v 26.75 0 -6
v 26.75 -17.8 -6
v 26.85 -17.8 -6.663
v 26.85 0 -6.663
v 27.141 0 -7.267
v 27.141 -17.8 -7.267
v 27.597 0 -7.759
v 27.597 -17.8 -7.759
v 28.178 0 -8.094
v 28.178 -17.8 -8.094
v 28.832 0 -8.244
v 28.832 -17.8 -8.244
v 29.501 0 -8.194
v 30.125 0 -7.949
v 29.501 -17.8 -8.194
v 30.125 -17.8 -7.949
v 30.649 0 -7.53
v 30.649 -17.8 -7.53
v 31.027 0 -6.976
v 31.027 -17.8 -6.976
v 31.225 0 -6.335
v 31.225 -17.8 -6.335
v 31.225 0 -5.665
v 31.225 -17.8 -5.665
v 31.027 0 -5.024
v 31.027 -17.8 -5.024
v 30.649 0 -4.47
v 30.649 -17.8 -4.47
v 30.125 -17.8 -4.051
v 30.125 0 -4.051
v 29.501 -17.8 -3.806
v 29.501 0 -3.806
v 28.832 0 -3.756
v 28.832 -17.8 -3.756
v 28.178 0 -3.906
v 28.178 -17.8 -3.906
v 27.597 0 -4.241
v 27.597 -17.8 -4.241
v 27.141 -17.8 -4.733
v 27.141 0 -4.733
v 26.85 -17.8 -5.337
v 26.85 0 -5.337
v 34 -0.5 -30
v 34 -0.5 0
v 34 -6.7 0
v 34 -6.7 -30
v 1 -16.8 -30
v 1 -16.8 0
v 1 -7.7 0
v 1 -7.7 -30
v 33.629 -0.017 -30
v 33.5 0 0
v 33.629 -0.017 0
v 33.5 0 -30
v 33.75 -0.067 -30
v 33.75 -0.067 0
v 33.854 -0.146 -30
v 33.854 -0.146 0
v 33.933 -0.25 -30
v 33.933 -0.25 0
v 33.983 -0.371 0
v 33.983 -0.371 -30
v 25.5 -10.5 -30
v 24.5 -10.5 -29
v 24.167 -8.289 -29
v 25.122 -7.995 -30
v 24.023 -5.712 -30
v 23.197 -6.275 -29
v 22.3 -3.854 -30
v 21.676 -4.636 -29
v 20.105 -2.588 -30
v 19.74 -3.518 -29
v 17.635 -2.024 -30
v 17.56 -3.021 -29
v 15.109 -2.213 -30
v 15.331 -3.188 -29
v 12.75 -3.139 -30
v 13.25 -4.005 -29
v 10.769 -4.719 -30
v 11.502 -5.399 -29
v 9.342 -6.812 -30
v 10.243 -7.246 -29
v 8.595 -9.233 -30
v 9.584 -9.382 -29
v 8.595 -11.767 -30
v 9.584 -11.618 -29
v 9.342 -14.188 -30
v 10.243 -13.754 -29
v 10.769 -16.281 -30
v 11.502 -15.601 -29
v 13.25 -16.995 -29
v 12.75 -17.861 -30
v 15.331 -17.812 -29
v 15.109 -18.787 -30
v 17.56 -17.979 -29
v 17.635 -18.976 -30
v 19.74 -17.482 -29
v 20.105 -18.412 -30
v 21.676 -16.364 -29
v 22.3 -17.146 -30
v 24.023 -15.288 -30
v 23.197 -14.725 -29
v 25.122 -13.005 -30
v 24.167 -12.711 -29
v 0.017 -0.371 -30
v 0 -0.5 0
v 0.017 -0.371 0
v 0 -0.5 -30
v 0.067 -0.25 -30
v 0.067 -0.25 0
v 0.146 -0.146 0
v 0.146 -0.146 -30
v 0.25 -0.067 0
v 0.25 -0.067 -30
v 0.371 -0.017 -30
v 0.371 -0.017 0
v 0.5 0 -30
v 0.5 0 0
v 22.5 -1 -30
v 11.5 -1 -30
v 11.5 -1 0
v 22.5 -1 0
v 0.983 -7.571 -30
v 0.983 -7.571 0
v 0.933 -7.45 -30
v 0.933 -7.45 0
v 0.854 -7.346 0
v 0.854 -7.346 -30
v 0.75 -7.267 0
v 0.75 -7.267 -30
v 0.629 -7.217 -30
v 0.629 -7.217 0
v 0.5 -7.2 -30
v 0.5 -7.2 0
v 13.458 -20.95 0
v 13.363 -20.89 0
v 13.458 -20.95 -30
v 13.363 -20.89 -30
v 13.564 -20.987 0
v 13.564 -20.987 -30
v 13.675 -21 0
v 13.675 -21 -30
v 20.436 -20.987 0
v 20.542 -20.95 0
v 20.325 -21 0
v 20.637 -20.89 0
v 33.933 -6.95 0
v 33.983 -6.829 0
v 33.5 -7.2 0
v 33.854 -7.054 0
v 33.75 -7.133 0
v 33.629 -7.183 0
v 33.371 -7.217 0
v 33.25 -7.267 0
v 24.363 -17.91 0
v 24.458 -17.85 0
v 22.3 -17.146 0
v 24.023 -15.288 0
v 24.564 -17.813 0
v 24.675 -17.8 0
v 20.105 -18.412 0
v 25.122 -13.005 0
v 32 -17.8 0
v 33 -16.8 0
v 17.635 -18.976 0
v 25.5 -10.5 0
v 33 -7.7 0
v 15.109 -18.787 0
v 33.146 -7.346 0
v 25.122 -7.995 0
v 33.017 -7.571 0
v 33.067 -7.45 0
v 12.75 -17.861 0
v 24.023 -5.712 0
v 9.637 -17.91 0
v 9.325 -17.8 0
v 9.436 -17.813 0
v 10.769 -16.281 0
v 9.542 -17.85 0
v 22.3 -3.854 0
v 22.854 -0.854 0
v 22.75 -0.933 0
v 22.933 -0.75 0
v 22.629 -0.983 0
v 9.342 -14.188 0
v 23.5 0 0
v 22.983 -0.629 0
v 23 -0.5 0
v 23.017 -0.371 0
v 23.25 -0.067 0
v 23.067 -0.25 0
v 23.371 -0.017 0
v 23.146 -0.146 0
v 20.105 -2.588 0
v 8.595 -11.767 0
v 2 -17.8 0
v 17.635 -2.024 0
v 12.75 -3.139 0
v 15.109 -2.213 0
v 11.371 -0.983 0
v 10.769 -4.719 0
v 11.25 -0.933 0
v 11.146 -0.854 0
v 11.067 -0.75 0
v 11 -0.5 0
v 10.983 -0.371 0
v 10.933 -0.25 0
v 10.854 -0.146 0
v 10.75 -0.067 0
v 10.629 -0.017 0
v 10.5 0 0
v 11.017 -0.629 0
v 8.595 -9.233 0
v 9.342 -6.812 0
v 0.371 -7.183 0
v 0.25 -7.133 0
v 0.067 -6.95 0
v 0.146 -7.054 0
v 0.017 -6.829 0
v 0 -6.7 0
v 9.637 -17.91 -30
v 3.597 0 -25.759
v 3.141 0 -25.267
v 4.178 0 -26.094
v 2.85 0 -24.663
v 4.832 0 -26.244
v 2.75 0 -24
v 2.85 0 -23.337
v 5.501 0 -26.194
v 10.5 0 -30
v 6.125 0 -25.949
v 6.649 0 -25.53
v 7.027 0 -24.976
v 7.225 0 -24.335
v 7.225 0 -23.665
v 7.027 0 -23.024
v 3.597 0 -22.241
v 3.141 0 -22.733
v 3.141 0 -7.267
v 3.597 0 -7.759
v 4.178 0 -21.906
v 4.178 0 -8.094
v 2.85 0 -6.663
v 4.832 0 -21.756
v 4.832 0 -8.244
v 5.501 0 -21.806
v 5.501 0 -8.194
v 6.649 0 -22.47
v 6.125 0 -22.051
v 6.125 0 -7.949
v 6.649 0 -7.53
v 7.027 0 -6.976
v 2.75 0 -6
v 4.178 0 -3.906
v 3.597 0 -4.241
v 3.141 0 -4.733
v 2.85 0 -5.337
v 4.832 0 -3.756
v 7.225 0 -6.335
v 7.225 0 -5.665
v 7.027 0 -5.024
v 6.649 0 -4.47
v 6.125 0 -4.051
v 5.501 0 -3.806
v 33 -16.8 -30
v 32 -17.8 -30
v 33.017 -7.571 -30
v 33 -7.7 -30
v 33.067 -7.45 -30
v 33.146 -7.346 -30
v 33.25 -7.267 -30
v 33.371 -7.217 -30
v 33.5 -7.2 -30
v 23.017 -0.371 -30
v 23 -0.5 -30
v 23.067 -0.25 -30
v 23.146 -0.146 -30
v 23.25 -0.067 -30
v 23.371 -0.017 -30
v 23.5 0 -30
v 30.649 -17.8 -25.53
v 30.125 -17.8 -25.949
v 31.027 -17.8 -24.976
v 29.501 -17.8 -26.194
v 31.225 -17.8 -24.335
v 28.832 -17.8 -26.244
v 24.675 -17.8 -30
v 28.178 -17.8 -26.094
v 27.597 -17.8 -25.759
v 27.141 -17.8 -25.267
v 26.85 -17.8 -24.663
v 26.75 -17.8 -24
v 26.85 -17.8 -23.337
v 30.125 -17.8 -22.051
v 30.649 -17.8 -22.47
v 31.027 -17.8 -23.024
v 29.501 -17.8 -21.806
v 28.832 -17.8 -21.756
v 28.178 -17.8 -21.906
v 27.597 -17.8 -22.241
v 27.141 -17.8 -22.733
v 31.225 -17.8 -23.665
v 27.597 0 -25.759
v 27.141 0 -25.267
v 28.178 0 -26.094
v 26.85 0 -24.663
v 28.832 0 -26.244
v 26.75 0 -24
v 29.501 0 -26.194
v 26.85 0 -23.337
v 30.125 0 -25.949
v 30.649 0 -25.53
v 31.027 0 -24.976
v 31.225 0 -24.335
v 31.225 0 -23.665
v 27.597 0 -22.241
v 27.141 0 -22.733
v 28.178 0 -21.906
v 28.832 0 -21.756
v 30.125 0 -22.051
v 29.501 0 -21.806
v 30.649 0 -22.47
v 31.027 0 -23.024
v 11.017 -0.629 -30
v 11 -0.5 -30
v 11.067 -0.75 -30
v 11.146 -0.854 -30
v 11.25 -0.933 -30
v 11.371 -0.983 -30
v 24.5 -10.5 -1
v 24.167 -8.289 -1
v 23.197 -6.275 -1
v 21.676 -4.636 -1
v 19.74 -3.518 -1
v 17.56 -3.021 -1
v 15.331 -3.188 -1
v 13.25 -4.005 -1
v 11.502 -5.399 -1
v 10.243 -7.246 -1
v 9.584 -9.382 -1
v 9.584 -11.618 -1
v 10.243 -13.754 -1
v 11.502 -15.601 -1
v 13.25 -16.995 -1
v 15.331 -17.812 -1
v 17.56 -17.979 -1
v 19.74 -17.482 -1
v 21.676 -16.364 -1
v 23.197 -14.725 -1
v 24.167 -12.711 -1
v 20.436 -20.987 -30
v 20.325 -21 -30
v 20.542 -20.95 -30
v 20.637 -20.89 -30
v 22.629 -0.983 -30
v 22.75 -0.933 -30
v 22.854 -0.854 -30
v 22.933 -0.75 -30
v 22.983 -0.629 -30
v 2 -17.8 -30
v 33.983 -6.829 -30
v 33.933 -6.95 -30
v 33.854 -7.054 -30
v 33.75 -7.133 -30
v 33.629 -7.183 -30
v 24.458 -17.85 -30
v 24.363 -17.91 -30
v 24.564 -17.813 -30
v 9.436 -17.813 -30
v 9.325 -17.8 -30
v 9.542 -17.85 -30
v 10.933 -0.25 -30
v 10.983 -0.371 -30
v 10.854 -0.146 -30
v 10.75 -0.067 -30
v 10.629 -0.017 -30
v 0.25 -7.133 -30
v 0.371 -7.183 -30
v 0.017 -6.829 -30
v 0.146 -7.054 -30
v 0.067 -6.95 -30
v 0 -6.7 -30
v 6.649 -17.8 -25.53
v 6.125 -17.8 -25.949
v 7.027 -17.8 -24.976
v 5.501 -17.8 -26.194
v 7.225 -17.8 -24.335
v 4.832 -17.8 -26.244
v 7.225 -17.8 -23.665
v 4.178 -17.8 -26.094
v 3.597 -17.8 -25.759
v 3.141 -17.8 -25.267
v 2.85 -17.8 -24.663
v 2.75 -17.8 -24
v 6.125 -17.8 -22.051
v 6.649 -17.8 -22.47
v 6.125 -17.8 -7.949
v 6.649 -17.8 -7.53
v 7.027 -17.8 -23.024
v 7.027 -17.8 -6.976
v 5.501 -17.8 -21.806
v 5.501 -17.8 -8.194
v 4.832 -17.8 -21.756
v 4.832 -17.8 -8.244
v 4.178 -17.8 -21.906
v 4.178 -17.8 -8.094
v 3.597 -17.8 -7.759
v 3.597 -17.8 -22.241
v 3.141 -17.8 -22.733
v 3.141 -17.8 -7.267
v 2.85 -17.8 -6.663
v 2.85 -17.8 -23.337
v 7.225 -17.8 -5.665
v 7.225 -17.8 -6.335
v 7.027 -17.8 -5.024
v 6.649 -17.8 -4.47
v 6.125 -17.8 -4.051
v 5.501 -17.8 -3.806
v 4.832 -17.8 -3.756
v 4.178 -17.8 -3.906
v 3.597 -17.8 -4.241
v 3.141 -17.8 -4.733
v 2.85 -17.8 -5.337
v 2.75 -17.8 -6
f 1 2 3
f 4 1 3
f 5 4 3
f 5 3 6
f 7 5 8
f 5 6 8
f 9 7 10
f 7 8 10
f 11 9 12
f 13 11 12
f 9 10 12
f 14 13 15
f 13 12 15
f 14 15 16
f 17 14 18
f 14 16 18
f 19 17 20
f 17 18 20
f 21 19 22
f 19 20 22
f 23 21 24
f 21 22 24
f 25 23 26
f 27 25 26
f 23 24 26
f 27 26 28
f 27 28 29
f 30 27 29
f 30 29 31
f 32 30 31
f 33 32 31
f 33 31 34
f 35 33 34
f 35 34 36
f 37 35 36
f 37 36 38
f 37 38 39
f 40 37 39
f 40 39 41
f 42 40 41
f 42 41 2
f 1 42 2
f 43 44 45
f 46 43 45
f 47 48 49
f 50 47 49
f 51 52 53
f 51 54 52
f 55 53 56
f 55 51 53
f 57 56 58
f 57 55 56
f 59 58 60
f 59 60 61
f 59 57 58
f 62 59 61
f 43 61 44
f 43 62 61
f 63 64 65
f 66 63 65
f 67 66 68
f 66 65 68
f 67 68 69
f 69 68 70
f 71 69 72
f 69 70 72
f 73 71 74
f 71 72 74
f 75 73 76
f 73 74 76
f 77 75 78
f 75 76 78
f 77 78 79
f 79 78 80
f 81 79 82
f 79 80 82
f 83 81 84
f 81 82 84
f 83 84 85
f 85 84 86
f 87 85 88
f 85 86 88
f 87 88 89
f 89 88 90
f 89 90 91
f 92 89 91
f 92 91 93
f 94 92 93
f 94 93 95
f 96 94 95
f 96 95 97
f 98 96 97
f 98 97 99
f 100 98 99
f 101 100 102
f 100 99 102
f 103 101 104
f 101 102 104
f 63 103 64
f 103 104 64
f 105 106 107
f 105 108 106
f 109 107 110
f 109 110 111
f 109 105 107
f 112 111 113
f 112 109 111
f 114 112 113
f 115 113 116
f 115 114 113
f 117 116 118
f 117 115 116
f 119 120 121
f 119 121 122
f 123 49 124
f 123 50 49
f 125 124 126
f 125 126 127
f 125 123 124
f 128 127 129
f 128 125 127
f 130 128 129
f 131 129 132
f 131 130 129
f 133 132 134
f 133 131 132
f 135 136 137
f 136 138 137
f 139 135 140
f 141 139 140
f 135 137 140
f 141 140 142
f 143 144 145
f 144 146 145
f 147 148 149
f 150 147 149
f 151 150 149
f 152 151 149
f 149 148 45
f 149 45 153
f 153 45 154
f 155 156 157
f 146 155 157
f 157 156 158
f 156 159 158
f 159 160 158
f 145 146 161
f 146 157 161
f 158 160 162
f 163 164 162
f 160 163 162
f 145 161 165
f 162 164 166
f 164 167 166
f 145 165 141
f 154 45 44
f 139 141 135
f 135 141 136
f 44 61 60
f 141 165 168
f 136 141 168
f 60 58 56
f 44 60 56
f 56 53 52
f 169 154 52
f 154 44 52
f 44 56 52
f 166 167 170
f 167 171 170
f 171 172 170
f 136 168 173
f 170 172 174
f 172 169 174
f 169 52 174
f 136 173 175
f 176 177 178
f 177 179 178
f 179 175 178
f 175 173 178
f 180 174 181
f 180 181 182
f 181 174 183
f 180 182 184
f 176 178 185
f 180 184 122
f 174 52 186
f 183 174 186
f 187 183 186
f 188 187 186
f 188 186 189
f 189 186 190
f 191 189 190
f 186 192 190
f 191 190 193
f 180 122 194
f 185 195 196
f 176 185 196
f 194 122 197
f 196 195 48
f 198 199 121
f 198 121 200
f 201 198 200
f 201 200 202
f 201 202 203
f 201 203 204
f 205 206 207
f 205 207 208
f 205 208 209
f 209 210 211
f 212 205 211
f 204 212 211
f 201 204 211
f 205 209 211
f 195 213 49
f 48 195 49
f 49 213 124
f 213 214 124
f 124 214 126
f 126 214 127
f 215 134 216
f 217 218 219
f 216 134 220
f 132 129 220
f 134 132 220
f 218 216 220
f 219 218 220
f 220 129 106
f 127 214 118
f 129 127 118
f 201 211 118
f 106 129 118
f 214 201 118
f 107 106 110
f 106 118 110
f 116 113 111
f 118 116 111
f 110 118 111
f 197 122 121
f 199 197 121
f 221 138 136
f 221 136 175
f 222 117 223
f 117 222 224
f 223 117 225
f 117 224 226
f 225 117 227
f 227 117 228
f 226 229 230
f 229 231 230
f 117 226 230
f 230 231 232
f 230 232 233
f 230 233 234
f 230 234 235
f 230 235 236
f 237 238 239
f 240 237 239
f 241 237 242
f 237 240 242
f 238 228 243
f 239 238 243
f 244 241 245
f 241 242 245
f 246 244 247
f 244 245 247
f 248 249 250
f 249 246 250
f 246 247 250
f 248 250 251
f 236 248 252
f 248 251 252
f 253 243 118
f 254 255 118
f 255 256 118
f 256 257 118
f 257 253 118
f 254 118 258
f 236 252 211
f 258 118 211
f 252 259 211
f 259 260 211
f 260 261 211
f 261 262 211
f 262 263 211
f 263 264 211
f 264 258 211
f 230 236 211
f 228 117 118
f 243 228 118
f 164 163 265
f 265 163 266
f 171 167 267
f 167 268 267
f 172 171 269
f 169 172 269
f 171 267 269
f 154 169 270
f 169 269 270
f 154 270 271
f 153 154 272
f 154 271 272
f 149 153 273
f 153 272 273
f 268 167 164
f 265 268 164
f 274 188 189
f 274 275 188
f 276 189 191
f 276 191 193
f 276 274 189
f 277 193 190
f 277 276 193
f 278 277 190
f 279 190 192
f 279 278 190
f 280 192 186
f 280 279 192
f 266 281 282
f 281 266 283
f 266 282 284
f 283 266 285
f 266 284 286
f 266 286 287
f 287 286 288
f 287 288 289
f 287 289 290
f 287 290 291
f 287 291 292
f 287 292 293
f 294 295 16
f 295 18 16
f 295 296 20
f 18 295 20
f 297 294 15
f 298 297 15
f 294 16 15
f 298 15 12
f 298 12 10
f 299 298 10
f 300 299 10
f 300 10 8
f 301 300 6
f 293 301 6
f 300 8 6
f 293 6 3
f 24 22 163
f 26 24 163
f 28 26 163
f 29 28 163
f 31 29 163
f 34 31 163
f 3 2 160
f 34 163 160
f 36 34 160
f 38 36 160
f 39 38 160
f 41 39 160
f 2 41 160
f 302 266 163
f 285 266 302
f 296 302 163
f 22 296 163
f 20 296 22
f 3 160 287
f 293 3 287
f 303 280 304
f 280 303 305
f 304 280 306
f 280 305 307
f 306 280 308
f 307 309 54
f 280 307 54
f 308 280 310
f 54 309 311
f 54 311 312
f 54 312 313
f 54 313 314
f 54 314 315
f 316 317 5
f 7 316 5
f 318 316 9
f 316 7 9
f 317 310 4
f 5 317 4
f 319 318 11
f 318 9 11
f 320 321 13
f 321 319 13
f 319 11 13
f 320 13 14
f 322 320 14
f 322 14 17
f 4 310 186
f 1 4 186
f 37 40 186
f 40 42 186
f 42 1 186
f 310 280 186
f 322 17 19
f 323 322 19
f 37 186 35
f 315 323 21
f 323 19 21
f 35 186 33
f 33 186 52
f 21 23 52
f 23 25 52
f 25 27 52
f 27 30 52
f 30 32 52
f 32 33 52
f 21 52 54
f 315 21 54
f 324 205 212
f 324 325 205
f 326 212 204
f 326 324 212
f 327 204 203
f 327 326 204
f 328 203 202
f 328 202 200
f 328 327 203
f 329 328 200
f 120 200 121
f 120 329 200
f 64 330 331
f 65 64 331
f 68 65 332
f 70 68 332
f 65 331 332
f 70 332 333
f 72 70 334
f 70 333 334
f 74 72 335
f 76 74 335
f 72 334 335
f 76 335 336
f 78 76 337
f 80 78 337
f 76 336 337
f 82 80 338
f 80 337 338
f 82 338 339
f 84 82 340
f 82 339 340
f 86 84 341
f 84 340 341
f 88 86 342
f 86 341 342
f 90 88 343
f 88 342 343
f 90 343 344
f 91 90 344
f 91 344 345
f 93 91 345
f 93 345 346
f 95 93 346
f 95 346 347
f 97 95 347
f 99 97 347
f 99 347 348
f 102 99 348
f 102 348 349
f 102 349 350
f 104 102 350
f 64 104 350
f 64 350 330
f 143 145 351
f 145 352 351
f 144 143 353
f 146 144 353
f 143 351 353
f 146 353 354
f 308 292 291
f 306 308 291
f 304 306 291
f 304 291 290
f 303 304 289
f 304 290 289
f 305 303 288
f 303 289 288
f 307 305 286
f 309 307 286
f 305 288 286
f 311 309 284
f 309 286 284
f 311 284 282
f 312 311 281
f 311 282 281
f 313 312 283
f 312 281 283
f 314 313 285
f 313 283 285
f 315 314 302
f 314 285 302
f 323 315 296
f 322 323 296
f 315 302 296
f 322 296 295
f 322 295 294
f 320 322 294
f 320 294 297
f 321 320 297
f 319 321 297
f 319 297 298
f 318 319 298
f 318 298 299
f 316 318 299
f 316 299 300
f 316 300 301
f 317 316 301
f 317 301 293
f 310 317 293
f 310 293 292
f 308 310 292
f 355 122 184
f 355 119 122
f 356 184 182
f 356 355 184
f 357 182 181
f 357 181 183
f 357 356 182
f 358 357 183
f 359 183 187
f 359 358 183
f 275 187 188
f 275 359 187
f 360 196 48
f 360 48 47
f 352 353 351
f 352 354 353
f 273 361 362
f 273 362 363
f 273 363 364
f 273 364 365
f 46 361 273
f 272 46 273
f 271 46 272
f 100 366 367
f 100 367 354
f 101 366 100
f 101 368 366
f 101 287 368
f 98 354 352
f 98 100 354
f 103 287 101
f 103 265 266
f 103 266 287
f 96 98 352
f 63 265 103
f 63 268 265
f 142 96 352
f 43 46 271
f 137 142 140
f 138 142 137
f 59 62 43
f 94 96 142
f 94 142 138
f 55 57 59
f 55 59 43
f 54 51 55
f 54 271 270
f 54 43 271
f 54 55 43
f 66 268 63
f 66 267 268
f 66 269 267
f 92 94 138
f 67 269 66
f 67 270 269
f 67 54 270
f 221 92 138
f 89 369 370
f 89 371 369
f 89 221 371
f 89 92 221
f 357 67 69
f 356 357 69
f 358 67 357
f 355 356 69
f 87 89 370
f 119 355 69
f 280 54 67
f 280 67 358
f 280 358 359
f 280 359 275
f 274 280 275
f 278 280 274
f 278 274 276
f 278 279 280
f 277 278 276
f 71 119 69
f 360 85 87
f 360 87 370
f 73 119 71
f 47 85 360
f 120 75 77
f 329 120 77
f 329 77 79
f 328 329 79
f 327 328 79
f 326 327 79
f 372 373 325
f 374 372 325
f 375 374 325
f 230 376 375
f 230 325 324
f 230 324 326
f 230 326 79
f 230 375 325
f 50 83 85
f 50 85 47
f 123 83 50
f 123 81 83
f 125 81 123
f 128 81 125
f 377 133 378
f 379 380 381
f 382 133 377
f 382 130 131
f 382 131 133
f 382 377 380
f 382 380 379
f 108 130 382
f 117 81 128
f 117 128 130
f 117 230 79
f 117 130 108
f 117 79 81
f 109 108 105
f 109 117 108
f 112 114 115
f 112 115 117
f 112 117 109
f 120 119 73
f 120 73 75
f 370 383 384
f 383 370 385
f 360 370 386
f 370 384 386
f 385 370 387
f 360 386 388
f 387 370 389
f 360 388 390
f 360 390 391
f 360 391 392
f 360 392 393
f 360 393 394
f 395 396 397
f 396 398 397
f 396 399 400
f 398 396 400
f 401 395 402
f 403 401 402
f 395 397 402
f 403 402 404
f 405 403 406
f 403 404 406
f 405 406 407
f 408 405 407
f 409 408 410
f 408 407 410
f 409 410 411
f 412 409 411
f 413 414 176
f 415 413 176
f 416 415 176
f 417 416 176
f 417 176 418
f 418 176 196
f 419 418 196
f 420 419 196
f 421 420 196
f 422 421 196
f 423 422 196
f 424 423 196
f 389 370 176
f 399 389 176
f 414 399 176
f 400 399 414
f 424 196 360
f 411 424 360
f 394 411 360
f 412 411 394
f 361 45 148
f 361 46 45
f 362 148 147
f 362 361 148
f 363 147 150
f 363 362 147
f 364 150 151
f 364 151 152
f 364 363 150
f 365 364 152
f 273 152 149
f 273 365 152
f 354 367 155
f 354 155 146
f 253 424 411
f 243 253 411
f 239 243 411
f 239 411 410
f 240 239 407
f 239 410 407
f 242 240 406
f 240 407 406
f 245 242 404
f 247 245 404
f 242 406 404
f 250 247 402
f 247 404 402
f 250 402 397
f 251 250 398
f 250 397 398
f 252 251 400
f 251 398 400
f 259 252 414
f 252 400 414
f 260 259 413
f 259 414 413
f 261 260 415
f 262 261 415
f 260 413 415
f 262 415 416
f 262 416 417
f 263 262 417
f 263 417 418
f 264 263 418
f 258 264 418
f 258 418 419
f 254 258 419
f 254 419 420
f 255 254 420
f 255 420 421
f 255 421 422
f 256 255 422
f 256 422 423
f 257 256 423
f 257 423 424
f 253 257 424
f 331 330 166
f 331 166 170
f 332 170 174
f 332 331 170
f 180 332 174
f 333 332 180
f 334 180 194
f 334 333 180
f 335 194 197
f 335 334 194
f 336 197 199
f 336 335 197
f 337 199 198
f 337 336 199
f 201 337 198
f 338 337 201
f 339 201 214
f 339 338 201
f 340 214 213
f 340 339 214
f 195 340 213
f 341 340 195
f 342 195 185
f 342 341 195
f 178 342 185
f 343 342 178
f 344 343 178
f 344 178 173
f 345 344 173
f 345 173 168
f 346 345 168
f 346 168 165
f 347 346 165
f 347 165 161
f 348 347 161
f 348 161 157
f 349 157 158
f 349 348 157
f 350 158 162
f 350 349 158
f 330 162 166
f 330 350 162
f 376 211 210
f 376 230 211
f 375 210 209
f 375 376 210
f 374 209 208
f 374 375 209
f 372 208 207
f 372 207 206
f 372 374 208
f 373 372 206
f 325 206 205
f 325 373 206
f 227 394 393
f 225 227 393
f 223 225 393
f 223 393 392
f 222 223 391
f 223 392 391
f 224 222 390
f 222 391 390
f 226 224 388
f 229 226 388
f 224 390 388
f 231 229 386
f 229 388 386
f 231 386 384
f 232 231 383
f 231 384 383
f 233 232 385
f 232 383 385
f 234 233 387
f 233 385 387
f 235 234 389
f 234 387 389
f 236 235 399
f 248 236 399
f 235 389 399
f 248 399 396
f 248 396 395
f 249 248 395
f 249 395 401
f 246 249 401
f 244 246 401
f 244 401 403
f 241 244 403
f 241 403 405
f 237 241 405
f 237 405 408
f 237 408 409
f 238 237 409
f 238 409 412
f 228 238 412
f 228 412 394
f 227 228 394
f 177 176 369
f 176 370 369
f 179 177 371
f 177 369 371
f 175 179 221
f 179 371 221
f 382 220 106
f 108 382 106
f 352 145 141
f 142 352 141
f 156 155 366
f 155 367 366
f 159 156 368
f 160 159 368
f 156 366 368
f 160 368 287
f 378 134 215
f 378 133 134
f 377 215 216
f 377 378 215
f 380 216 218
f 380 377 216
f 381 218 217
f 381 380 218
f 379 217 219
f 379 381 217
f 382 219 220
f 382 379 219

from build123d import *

# Parameters (mm, degrees)
ESTRUSIONE_ESTRUSIONE1_DEPTH = 30
SCHIZZO3_R                   = 7.5
TAGLIO_ESTRUSIONE2_DEPTH     = 50.969990995
SMUSSO1_SIZE                 = 1
RACCORDO1_R                  = 0.5
FORO_PER_VITE_M4_1_D         = 4.5


with BuildPart() as part:
    # Schizzo2 → Estrusione-Estrusione1 (new body)
    with BuildSketch(Plane.XY):
        Polygon((0, 0), (11, 0), (11, -1), (23, -1), (23, 0), (34, 0), (34, -7.2), (33, -7.2), (33, -17.8), (24.5, -17.8), (20.5, -21), (13.5, -21), (9.5, -17.8), (1, -17.8), (1, -7.2), (0, -7.2), align=None)
    extrude(amount=-ESTRUSIONE_ESTRUSIONE1_DEPTH)

    # Schizzo3 → Taglio-Estrusione2 (cut, through all)
    with BuildSketch(Plane.XY):
        with Locations((17, -10.5)):
            Circle(SCHIZZO3_R)
    extrude(amount=-TAGLIO_ESTRUSIONE2_DEPTH, mode=Mode.SUBTRACT)

    # Smusso1
    smusso1_edges = [part.edges().sort_by_distance(p)[0] for p in [
        (33, -17.8, -15),
        (1, -17.8, -15),
        (9.5, -10.5, -30),
        (9.5, -10.5, 0),
    ]]
    chamfer(smusso1_edges, length=SMUSSO1_SIZE)

    # Raccordo1
    raccordo1_edges = [part.edges().sort_by_distance(p)[0] for p in [
        (9.5, -17.8, -15),
        (24.5, -17.8, -15),
        (20.5, -21, -15),
        (13.5, -21, -15),
        (1, -7.2, -15),
        (0, -7.2, -15),
        (0, 0, -15),
        (23, -1, -15),
        (11, -1, -15),
        (11, 0, -15),
        (23, 0, -15),
        (34, 0, -15),
        (34, -7.2, -15),
        (33, -7.2, -15),
    ]]
    fillet(raccordo1_edges, radius=RACCORDO1_R - 0.0001)  # a hair under: the kernel refuses the full size

    # Foro per Vite M4-1 (through all)
    with Locations(Plane(origin=(0, 0, 0), x_dir=(1, 0, 0), z_dir=(0, 1, 0))):
        with Locations((29, 24), (29, 6), (5, 6), (5, 24)):
            Hole(FORO_PER_VITE_M4_1_D / 2)


solid = part.part
